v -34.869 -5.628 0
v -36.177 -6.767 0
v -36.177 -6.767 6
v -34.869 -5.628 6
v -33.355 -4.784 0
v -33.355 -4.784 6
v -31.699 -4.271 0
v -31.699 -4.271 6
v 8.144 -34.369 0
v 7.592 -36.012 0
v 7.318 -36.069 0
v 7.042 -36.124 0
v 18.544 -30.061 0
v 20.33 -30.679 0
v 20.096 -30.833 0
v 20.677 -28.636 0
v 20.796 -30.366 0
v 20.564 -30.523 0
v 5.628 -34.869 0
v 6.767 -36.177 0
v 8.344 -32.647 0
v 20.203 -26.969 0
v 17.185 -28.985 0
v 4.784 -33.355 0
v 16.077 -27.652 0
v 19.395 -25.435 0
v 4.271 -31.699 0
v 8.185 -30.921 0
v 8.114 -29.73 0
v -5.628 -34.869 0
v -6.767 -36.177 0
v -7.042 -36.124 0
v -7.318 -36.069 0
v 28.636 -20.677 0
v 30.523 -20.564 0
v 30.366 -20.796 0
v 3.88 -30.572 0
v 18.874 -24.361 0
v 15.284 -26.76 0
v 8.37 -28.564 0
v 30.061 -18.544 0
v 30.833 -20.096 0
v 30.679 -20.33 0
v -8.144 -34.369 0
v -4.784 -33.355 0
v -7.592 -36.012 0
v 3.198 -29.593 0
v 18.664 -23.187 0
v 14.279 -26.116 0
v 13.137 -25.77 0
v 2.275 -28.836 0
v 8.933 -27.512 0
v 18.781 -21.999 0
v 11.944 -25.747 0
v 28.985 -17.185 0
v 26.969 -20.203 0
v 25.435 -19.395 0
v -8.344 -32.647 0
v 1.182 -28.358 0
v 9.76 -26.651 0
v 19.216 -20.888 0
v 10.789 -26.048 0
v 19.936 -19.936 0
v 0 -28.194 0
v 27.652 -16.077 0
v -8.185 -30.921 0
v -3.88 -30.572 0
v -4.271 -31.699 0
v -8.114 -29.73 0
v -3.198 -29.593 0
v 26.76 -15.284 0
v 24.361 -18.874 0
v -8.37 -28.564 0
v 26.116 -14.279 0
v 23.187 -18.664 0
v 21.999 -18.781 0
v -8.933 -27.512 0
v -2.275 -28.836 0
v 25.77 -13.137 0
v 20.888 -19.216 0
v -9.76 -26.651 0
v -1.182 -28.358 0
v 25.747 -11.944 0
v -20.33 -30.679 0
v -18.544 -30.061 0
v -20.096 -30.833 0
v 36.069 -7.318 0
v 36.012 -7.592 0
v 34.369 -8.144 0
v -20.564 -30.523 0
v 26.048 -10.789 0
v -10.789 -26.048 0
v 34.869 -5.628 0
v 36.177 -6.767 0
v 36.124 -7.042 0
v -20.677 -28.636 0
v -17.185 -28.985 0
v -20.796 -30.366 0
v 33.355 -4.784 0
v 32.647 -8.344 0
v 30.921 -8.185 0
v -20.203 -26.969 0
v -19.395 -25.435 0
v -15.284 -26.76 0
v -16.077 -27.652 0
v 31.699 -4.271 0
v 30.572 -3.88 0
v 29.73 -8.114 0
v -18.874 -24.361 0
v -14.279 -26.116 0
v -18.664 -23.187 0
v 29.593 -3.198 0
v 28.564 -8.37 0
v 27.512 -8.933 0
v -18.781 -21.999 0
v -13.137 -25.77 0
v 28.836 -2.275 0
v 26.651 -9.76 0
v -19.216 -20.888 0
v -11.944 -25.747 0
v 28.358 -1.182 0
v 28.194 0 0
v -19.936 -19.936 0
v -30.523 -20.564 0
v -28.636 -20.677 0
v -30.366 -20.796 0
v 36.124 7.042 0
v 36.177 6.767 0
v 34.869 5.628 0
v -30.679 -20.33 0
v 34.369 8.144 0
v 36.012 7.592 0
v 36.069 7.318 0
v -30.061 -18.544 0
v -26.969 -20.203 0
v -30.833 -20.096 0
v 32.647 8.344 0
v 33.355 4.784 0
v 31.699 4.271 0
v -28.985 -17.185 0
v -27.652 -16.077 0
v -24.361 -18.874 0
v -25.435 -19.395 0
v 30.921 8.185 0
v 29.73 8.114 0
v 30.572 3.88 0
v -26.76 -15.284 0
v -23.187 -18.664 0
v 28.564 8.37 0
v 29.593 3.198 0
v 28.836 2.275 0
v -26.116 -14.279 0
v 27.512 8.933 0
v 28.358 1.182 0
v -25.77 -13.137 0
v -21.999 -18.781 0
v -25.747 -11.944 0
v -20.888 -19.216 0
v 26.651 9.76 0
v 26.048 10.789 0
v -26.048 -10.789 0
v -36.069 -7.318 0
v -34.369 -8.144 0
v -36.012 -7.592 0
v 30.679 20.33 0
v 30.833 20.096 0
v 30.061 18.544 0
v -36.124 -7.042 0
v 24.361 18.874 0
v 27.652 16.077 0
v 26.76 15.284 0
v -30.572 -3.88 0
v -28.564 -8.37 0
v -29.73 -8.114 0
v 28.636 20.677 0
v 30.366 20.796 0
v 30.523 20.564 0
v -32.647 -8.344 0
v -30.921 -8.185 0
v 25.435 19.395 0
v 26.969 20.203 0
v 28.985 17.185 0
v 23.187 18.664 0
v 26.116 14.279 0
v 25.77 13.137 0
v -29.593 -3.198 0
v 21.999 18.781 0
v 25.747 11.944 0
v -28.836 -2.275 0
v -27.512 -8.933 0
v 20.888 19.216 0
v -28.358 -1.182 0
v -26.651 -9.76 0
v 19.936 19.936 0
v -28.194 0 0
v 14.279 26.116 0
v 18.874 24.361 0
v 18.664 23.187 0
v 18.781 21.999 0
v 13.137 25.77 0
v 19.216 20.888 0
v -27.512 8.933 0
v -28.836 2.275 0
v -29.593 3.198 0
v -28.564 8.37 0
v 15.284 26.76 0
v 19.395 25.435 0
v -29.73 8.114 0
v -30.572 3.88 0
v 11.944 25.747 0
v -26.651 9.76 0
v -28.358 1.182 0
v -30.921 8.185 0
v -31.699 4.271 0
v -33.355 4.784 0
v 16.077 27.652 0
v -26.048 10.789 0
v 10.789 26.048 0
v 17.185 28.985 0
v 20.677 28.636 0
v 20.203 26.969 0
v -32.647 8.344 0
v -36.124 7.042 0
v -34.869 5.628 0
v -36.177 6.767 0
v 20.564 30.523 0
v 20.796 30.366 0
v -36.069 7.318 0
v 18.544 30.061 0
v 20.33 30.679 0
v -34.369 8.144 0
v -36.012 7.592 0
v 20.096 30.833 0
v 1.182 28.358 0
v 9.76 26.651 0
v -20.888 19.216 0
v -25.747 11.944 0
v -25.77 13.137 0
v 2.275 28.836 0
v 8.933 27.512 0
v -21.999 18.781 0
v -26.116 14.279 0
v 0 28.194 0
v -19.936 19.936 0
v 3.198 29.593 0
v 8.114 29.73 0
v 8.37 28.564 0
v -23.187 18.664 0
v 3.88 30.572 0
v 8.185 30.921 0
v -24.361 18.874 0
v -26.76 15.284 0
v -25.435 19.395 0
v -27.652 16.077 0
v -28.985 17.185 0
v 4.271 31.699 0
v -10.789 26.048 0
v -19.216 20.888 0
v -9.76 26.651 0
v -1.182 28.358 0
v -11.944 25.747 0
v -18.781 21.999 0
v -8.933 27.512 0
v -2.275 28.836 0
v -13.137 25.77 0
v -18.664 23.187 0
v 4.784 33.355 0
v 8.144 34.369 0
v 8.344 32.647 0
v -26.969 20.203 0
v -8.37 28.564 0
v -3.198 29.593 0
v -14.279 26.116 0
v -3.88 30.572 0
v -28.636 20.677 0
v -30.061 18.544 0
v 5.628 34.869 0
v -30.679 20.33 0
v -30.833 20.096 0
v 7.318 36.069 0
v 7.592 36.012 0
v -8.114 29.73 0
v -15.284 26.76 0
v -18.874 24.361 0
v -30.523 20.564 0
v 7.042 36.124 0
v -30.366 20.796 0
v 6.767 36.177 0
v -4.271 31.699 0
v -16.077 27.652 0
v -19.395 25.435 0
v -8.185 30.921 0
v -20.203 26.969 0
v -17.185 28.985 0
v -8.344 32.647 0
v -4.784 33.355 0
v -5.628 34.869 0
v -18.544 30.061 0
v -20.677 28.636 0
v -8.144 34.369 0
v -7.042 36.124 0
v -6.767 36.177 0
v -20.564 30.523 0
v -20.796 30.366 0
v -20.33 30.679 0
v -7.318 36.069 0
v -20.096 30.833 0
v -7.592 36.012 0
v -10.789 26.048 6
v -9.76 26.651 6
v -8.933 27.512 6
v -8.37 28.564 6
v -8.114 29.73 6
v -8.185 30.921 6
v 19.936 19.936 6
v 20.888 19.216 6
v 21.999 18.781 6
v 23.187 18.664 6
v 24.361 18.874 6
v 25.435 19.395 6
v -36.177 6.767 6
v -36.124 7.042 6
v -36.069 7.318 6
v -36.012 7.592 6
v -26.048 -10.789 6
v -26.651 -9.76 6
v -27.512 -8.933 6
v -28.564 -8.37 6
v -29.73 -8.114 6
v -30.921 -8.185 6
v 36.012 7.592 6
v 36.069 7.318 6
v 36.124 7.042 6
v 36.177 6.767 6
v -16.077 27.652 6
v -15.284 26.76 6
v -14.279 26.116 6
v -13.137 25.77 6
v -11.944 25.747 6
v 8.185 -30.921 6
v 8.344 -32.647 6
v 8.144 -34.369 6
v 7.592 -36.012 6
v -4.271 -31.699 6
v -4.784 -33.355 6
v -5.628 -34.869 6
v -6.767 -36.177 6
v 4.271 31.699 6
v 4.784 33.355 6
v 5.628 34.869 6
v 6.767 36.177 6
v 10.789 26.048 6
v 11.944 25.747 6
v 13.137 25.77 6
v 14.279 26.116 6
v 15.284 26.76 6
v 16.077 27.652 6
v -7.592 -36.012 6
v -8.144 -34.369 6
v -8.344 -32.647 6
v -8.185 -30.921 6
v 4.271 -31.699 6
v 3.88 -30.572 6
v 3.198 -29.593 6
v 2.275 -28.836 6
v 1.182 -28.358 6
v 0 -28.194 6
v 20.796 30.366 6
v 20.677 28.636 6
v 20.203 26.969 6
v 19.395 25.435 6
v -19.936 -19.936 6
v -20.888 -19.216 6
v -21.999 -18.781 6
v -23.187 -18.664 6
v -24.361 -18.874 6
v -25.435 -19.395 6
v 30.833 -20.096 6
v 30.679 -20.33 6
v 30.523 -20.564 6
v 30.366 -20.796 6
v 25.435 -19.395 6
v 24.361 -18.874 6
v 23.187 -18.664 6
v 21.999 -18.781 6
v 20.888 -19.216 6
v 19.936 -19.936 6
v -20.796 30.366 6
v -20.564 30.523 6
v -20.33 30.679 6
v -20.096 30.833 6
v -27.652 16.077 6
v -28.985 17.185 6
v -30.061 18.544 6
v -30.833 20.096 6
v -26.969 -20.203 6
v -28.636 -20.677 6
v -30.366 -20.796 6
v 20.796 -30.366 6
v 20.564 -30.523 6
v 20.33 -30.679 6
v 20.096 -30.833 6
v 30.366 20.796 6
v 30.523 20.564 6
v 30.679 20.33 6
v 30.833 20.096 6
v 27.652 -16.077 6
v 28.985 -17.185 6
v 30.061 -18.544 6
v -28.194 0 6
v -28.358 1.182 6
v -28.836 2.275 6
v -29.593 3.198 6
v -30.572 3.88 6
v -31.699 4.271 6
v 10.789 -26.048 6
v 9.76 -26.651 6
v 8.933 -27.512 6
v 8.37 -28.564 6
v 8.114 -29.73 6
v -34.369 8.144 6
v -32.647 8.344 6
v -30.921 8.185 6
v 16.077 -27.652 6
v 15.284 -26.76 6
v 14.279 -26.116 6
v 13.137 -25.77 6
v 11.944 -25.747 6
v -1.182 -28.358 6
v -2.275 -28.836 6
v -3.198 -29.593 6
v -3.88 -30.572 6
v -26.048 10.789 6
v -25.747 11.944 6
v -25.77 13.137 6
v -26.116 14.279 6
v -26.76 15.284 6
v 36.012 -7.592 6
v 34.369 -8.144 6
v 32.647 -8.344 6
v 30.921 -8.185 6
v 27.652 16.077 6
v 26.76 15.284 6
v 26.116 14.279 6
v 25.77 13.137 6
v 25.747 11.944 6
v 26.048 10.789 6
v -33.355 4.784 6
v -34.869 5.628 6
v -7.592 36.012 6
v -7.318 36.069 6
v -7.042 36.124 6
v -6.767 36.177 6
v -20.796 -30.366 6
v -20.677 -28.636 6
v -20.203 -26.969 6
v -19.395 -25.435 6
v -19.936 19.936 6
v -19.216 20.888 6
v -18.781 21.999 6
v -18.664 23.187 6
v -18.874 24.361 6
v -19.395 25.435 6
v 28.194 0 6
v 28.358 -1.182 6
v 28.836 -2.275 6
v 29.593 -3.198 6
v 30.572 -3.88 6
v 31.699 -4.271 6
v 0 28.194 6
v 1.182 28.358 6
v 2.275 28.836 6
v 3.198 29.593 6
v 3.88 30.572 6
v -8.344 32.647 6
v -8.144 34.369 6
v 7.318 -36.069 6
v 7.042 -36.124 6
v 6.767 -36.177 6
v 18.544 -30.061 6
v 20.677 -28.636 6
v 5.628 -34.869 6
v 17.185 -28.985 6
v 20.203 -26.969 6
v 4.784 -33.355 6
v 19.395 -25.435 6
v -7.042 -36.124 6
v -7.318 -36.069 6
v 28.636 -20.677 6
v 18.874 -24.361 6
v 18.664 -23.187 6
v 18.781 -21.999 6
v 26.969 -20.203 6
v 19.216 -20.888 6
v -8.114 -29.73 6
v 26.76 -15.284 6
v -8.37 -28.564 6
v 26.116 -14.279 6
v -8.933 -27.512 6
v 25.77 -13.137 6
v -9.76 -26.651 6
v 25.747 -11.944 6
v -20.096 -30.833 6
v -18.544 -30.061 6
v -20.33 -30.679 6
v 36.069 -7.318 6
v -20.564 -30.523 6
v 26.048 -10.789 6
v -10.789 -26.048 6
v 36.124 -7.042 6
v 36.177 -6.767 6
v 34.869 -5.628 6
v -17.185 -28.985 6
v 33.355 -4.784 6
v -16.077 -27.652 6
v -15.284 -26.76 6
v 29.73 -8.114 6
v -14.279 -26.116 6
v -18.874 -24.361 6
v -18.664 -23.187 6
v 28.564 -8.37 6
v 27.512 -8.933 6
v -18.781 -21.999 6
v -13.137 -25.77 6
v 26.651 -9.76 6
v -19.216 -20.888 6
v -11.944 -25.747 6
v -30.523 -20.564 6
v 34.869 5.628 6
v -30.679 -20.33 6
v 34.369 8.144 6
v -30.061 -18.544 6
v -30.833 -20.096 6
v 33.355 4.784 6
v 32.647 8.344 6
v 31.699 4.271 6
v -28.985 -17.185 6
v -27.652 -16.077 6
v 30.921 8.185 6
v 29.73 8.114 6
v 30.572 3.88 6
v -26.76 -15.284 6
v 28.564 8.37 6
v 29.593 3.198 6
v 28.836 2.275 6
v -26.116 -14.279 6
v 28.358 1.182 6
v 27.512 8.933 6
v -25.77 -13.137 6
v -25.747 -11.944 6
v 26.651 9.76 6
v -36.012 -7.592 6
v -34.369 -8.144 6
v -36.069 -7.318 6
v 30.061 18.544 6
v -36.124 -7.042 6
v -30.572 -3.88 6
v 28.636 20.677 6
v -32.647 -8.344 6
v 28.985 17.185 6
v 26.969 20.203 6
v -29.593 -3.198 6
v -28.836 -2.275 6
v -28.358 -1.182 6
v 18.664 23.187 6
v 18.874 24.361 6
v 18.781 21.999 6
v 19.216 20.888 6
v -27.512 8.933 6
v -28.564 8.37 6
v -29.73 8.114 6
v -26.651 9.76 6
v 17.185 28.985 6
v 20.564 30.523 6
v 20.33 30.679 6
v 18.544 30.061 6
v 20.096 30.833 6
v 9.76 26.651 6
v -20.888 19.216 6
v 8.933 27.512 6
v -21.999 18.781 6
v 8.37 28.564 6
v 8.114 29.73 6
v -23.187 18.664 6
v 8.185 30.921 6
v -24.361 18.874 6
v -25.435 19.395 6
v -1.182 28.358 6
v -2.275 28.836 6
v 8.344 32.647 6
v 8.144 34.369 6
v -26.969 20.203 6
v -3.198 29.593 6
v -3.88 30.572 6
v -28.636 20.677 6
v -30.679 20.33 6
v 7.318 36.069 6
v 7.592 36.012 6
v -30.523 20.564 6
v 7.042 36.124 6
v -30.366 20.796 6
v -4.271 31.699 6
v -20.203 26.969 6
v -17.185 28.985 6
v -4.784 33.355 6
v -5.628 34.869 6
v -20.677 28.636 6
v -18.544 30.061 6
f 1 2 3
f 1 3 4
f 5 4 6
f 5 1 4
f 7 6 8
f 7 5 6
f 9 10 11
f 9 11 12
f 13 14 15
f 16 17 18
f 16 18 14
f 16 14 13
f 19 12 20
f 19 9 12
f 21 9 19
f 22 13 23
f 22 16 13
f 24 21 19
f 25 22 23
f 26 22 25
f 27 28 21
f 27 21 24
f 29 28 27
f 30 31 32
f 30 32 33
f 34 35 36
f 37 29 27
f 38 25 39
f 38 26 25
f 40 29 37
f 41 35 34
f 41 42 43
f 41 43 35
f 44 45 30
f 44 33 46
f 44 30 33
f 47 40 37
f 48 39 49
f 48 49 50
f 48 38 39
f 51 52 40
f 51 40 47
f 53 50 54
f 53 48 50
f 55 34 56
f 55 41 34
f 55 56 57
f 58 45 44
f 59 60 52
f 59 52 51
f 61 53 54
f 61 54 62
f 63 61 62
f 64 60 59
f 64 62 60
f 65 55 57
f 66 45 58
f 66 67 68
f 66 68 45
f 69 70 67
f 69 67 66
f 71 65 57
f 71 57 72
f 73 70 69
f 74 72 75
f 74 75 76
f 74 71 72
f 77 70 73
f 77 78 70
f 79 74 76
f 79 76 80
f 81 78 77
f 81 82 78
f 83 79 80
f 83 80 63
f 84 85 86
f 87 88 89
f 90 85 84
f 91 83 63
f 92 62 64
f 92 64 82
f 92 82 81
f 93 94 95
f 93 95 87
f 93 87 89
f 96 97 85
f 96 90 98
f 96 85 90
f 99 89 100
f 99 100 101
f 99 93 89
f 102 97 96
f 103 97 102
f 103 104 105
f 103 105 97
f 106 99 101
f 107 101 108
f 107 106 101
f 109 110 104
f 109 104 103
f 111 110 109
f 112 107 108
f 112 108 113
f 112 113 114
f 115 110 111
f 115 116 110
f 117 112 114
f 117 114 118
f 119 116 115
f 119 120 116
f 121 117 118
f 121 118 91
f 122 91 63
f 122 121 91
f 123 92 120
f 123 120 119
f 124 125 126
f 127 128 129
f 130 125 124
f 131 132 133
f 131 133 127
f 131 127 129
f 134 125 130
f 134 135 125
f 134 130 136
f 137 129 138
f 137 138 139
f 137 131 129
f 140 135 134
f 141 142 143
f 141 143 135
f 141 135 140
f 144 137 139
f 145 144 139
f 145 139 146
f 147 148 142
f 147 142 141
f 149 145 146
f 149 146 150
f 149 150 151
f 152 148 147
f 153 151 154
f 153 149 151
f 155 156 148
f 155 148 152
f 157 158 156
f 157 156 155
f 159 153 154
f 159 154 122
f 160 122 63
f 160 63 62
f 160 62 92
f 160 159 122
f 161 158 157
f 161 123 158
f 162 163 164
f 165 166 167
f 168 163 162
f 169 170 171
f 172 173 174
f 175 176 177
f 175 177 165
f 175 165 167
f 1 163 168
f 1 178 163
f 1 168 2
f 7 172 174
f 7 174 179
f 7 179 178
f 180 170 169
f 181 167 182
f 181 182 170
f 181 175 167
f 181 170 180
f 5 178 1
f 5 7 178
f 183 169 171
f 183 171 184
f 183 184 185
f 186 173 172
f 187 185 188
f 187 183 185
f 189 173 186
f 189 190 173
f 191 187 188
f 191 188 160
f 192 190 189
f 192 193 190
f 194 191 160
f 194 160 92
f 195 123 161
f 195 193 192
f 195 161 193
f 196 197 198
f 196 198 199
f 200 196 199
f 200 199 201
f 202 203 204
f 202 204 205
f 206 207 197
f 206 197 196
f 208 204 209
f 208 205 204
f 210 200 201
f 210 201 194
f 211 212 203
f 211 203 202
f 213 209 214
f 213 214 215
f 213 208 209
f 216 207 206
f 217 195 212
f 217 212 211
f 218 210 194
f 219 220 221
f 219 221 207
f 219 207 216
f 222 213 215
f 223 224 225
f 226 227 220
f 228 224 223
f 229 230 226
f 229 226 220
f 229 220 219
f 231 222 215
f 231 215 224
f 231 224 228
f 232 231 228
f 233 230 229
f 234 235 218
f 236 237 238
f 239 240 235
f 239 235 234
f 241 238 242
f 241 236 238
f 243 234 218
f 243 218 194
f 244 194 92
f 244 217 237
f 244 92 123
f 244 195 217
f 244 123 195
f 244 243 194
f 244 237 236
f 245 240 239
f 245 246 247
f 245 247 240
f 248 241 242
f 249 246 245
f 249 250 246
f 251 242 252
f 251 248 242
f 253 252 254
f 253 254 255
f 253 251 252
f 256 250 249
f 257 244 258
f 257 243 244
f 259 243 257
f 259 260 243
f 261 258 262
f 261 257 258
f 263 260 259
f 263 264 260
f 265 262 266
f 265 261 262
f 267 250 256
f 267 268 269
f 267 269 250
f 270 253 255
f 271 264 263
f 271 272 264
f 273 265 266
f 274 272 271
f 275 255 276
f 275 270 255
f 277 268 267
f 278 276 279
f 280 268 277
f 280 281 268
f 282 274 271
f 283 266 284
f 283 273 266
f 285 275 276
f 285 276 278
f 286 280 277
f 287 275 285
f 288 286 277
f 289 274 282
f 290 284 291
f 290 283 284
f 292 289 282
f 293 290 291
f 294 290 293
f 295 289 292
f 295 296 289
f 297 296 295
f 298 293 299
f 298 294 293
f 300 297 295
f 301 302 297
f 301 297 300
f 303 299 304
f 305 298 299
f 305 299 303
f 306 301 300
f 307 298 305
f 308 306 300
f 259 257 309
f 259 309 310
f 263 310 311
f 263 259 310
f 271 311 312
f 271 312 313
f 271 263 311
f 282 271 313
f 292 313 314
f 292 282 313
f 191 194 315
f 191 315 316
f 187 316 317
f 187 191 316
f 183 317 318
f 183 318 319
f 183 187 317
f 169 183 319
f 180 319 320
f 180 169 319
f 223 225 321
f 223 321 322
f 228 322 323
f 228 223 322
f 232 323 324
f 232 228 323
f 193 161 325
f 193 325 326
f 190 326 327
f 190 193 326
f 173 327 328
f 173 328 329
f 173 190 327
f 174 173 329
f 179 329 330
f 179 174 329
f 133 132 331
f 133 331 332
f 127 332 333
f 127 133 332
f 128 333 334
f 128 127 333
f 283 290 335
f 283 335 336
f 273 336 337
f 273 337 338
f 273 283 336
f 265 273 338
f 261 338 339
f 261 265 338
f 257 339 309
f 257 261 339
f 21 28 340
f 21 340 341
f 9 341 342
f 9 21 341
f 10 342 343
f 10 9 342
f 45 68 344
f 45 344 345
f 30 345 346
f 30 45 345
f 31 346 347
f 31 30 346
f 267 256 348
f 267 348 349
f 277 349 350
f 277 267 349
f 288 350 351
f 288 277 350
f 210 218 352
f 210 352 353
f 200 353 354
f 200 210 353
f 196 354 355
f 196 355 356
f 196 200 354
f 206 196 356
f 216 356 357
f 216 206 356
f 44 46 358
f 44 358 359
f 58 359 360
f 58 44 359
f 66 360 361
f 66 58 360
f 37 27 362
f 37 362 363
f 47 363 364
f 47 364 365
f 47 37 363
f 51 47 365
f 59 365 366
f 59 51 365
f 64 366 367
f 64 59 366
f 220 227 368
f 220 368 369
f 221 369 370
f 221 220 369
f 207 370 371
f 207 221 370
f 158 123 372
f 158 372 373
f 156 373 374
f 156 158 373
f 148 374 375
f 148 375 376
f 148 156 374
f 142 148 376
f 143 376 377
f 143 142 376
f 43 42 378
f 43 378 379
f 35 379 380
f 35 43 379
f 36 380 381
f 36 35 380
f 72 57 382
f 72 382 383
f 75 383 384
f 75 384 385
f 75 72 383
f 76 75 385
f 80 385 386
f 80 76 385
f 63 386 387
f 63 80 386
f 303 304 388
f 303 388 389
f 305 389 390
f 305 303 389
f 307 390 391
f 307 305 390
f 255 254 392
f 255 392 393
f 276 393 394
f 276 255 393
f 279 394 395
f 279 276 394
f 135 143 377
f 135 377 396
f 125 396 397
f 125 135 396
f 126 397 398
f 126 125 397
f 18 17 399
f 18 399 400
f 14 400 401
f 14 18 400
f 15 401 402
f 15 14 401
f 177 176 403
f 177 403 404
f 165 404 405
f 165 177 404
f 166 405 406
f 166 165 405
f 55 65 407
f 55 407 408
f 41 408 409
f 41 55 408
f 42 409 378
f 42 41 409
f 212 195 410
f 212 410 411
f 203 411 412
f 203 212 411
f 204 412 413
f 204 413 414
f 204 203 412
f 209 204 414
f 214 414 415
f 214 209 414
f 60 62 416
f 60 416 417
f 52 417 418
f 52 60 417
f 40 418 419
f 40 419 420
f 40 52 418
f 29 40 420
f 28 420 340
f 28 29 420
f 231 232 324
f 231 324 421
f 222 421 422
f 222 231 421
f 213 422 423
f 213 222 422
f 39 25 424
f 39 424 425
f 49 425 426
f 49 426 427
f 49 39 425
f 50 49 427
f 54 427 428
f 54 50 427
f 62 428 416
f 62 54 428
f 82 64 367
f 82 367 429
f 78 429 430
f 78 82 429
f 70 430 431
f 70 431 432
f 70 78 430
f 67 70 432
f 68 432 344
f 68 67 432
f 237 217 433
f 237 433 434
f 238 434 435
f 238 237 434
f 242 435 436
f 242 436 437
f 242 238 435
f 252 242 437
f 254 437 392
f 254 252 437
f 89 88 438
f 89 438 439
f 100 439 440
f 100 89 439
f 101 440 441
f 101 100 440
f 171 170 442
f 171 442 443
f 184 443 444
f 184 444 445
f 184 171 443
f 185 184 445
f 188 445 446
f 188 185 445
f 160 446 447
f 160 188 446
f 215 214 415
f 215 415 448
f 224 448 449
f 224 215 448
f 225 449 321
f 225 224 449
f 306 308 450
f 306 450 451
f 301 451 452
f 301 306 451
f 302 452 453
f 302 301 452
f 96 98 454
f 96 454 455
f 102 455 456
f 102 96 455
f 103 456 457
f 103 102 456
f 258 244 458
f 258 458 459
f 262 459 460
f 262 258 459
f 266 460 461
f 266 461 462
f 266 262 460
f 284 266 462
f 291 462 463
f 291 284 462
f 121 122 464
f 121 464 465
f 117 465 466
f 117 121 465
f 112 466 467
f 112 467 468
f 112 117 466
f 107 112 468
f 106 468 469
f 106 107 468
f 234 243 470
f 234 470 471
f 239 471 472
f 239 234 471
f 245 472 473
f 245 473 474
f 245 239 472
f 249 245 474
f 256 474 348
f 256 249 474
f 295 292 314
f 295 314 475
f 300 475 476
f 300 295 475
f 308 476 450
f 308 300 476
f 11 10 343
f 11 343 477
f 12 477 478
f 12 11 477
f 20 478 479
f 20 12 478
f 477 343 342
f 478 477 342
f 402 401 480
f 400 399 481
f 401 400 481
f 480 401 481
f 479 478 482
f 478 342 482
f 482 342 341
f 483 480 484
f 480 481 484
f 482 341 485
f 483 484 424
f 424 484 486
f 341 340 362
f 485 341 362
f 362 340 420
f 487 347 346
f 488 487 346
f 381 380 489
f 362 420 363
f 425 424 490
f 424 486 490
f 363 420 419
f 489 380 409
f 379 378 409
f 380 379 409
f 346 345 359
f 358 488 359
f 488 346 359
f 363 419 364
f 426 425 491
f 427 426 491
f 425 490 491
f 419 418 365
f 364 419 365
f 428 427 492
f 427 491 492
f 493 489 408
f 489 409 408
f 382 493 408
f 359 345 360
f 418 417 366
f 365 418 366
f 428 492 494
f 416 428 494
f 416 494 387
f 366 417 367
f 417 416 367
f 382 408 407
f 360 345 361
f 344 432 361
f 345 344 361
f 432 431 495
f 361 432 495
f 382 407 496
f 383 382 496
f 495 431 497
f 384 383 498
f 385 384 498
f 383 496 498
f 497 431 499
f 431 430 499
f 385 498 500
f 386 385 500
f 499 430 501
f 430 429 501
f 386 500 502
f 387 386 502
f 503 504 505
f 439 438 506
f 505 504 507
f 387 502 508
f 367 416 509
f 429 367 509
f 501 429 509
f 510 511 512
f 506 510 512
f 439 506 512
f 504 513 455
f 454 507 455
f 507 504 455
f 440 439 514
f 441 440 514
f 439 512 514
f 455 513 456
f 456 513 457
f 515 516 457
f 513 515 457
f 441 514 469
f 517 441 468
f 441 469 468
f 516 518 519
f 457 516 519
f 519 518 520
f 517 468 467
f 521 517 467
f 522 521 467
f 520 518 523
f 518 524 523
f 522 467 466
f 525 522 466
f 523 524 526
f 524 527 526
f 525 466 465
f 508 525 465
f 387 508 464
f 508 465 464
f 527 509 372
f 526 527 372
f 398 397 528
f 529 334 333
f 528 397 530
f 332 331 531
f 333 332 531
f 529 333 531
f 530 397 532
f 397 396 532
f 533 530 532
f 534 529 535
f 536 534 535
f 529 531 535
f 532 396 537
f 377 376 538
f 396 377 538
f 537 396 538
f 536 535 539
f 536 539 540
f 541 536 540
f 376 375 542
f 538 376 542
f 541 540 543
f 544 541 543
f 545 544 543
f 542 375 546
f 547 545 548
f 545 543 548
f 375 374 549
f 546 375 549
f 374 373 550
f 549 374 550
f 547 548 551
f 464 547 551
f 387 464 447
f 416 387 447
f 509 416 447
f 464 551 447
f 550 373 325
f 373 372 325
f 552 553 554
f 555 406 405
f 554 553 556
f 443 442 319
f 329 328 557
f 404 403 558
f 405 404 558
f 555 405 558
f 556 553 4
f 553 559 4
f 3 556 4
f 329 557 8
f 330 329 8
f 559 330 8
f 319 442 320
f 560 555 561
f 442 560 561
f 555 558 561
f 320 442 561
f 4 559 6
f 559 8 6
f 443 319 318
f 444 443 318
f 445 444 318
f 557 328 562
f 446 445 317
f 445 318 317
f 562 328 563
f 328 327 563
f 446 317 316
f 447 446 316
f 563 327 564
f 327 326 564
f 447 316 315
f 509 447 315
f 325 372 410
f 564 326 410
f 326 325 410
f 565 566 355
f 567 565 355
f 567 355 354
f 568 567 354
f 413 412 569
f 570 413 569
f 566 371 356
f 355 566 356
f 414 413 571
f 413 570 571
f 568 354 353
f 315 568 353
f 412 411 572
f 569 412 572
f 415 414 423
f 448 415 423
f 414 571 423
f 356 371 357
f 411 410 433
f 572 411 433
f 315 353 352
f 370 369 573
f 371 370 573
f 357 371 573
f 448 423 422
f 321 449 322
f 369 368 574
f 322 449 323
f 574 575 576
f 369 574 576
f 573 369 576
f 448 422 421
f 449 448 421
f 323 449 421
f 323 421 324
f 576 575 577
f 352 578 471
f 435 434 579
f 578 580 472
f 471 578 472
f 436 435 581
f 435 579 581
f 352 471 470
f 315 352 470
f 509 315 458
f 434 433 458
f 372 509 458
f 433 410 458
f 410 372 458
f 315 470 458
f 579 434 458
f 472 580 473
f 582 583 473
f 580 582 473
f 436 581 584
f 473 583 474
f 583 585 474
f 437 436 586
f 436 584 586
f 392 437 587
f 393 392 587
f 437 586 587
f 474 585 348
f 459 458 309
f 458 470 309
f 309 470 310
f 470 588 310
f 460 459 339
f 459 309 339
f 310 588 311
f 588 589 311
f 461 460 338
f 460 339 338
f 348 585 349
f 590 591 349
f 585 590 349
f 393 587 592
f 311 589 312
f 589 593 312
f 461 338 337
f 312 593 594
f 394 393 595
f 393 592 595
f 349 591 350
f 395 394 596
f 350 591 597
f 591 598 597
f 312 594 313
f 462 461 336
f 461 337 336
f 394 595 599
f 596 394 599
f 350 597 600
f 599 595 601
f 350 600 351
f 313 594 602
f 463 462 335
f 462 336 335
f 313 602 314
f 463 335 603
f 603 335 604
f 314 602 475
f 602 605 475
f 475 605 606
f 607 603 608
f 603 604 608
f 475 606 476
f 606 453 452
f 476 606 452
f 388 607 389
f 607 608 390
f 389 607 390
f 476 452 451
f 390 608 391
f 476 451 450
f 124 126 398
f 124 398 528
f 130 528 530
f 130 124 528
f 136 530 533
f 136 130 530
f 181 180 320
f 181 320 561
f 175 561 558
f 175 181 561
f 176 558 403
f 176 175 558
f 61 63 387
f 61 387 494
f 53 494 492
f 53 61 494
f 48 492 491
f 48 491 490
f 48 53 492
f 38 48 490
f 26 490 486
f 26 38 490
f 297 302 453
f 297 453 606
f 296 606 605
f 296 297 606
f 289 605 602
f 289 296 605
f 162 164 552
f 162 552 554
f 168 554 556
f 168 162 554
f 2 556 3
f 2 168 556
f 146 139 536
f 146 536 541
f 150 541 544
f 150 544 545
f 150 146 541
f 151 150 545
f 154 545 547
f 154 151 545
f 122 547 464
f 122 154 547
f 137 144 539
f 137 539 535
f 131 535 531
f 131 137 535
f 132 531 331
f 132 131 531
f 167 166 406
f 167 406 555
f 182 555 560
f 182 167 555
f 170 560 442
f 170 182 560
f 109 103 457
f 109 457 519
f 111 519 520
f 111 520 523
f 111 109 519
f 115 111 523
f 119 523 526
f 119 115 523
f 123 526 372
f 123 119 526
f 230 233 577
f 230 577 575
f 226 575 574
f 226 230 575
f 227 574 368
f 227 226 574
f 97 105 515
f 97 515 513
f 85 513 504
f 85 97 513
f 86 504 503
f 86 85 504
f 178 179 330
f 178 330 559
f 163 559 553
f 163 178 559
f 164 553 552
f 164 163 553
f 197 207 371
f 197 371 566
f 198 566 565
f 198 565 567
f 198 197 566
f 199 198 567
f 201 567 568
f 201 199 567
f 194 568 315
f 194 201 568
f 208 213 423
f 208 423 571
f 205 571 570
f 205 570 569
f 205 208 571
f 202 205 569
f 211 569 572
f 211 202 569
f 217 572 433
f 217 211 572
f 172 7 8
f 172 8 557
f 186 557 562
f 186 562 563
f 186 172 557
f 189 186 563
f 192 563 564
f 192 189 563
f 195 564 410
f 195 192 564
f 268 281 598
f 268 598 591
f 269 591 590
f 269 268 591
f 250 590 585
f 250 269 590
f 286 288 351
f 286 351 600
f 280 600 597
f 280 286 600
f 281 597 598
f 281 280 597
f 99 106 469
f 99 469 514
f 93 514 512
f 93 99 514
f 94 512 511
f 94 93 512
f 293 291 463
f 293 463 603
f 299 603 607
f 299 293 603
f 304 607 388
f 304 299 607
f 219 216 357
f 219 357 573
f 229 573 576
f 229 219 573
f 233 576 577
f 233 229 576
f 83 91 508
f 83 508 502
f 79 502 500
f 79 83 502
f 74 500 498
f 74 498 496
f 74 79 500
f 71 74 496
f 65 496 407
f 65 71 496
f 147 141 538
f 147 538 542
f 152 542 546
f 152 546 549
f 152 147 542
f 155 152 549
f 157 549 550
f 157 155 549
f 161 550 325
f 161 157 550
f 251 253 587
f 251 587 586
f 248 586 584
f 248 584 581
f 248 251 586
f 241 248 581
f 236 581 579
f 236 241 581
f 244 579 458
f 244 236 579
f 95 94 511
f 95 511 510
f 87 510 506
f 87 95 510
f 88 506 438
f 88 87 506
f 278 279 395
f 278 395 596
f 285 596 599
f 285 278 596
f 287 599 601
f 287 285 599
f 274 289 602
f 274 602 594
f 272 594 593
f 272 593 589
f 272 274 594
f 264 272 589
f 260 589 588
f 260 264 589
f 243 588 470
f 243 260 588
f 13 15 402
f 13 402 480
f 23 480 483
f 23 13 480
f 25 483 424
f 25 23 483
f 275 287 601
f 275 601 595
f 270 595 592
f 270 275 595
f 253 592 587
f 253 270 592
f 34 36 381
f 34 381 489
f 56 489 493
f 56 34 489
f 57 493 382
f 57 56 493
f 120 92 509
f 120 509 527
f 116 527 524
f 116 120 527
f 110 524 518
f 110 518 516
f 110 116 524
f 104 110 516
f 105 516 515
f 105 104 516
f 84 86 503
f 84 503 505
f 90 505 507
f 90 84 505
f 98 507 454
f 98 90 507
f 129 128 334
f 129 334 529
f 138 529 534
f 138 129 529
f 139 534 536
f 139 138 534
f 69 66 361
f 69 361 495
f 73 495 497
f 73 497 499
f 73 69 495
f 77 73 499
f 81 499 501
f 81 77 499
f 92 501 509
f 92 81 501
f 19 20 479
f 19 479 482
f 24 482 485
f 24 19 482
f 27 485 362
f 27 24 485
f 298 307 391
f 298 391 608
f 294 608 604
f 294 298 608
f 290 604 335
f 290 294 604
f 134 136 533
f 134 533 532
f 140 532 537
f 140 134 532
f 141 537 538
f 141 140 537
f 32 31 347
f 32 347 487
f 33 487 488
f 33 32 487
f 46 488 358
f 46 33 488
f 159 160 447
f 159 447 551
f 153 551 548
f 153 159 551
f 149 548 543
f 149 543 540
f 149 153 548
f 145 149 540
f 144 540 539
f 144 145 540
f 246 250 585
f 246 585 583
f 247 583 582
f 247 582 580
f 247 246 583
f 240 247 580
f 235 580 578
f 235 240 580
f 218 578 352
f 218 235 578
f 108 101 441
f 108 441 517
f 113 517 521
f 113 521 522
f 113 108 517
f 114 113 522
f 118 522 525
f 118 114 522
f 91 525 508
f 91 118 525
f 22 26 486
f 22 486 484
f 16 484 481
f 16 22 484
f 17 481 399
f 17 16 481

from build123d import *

# Parameters (mm, degrees)
EXTRUDE_1_DEPTH          = 6
PATTERN_CIRCULAR_1_COUNT = 16


with BuildPart() as part:
    # Эскиз2 → Бобышка-Вытянуть1 (new body)
    with BuildSketch(Plane.XY):
        with BuildLine():
            Line((0, 0), (0, 28.194026186))
            ThreePointArc((0, 28.194026186), (2.762782753, 29.182565662), (4.271319896, 31.699407834))
            ThreePointArc((4.271319896, 31.699407834), (5.166850576, 34.134348257), (6.766906166, 36.176585307))
            ThreePointArc((6.766906166, 36.176585307), (7.18010932, 36.096847143), (7.592373731, 36.012389599))
            ThreePointArc((7.592373731, 36.012389599), (8.289102058, 33.513293823), (8.184653165, 30.920997449))
            ThreePointArc((8.184653165, 30.920997449), (8.615205955, 28.018446308), (10.789386713, 26.047883733))
            Line((10.789386713, 26.047883733), (0, 0))
        make_face()
    extrude_1 = extrude(amount=EXTRUDE_1_DEPTH)

    # Круговой массив1: Бобышка-Вытянуть1 ×16 about axis
    pattern_circular_1_axis = Axis((0, 0, 0), (0, 0, 1))
    for i in range(1, PATTERN_CIRCULAR_1_COUNT):
        add(extrude_1.rotate(pattern_circular_1_axis, i * 360 / PATTERN_CIRCULAR_1_COUNT))


solid = part.part
